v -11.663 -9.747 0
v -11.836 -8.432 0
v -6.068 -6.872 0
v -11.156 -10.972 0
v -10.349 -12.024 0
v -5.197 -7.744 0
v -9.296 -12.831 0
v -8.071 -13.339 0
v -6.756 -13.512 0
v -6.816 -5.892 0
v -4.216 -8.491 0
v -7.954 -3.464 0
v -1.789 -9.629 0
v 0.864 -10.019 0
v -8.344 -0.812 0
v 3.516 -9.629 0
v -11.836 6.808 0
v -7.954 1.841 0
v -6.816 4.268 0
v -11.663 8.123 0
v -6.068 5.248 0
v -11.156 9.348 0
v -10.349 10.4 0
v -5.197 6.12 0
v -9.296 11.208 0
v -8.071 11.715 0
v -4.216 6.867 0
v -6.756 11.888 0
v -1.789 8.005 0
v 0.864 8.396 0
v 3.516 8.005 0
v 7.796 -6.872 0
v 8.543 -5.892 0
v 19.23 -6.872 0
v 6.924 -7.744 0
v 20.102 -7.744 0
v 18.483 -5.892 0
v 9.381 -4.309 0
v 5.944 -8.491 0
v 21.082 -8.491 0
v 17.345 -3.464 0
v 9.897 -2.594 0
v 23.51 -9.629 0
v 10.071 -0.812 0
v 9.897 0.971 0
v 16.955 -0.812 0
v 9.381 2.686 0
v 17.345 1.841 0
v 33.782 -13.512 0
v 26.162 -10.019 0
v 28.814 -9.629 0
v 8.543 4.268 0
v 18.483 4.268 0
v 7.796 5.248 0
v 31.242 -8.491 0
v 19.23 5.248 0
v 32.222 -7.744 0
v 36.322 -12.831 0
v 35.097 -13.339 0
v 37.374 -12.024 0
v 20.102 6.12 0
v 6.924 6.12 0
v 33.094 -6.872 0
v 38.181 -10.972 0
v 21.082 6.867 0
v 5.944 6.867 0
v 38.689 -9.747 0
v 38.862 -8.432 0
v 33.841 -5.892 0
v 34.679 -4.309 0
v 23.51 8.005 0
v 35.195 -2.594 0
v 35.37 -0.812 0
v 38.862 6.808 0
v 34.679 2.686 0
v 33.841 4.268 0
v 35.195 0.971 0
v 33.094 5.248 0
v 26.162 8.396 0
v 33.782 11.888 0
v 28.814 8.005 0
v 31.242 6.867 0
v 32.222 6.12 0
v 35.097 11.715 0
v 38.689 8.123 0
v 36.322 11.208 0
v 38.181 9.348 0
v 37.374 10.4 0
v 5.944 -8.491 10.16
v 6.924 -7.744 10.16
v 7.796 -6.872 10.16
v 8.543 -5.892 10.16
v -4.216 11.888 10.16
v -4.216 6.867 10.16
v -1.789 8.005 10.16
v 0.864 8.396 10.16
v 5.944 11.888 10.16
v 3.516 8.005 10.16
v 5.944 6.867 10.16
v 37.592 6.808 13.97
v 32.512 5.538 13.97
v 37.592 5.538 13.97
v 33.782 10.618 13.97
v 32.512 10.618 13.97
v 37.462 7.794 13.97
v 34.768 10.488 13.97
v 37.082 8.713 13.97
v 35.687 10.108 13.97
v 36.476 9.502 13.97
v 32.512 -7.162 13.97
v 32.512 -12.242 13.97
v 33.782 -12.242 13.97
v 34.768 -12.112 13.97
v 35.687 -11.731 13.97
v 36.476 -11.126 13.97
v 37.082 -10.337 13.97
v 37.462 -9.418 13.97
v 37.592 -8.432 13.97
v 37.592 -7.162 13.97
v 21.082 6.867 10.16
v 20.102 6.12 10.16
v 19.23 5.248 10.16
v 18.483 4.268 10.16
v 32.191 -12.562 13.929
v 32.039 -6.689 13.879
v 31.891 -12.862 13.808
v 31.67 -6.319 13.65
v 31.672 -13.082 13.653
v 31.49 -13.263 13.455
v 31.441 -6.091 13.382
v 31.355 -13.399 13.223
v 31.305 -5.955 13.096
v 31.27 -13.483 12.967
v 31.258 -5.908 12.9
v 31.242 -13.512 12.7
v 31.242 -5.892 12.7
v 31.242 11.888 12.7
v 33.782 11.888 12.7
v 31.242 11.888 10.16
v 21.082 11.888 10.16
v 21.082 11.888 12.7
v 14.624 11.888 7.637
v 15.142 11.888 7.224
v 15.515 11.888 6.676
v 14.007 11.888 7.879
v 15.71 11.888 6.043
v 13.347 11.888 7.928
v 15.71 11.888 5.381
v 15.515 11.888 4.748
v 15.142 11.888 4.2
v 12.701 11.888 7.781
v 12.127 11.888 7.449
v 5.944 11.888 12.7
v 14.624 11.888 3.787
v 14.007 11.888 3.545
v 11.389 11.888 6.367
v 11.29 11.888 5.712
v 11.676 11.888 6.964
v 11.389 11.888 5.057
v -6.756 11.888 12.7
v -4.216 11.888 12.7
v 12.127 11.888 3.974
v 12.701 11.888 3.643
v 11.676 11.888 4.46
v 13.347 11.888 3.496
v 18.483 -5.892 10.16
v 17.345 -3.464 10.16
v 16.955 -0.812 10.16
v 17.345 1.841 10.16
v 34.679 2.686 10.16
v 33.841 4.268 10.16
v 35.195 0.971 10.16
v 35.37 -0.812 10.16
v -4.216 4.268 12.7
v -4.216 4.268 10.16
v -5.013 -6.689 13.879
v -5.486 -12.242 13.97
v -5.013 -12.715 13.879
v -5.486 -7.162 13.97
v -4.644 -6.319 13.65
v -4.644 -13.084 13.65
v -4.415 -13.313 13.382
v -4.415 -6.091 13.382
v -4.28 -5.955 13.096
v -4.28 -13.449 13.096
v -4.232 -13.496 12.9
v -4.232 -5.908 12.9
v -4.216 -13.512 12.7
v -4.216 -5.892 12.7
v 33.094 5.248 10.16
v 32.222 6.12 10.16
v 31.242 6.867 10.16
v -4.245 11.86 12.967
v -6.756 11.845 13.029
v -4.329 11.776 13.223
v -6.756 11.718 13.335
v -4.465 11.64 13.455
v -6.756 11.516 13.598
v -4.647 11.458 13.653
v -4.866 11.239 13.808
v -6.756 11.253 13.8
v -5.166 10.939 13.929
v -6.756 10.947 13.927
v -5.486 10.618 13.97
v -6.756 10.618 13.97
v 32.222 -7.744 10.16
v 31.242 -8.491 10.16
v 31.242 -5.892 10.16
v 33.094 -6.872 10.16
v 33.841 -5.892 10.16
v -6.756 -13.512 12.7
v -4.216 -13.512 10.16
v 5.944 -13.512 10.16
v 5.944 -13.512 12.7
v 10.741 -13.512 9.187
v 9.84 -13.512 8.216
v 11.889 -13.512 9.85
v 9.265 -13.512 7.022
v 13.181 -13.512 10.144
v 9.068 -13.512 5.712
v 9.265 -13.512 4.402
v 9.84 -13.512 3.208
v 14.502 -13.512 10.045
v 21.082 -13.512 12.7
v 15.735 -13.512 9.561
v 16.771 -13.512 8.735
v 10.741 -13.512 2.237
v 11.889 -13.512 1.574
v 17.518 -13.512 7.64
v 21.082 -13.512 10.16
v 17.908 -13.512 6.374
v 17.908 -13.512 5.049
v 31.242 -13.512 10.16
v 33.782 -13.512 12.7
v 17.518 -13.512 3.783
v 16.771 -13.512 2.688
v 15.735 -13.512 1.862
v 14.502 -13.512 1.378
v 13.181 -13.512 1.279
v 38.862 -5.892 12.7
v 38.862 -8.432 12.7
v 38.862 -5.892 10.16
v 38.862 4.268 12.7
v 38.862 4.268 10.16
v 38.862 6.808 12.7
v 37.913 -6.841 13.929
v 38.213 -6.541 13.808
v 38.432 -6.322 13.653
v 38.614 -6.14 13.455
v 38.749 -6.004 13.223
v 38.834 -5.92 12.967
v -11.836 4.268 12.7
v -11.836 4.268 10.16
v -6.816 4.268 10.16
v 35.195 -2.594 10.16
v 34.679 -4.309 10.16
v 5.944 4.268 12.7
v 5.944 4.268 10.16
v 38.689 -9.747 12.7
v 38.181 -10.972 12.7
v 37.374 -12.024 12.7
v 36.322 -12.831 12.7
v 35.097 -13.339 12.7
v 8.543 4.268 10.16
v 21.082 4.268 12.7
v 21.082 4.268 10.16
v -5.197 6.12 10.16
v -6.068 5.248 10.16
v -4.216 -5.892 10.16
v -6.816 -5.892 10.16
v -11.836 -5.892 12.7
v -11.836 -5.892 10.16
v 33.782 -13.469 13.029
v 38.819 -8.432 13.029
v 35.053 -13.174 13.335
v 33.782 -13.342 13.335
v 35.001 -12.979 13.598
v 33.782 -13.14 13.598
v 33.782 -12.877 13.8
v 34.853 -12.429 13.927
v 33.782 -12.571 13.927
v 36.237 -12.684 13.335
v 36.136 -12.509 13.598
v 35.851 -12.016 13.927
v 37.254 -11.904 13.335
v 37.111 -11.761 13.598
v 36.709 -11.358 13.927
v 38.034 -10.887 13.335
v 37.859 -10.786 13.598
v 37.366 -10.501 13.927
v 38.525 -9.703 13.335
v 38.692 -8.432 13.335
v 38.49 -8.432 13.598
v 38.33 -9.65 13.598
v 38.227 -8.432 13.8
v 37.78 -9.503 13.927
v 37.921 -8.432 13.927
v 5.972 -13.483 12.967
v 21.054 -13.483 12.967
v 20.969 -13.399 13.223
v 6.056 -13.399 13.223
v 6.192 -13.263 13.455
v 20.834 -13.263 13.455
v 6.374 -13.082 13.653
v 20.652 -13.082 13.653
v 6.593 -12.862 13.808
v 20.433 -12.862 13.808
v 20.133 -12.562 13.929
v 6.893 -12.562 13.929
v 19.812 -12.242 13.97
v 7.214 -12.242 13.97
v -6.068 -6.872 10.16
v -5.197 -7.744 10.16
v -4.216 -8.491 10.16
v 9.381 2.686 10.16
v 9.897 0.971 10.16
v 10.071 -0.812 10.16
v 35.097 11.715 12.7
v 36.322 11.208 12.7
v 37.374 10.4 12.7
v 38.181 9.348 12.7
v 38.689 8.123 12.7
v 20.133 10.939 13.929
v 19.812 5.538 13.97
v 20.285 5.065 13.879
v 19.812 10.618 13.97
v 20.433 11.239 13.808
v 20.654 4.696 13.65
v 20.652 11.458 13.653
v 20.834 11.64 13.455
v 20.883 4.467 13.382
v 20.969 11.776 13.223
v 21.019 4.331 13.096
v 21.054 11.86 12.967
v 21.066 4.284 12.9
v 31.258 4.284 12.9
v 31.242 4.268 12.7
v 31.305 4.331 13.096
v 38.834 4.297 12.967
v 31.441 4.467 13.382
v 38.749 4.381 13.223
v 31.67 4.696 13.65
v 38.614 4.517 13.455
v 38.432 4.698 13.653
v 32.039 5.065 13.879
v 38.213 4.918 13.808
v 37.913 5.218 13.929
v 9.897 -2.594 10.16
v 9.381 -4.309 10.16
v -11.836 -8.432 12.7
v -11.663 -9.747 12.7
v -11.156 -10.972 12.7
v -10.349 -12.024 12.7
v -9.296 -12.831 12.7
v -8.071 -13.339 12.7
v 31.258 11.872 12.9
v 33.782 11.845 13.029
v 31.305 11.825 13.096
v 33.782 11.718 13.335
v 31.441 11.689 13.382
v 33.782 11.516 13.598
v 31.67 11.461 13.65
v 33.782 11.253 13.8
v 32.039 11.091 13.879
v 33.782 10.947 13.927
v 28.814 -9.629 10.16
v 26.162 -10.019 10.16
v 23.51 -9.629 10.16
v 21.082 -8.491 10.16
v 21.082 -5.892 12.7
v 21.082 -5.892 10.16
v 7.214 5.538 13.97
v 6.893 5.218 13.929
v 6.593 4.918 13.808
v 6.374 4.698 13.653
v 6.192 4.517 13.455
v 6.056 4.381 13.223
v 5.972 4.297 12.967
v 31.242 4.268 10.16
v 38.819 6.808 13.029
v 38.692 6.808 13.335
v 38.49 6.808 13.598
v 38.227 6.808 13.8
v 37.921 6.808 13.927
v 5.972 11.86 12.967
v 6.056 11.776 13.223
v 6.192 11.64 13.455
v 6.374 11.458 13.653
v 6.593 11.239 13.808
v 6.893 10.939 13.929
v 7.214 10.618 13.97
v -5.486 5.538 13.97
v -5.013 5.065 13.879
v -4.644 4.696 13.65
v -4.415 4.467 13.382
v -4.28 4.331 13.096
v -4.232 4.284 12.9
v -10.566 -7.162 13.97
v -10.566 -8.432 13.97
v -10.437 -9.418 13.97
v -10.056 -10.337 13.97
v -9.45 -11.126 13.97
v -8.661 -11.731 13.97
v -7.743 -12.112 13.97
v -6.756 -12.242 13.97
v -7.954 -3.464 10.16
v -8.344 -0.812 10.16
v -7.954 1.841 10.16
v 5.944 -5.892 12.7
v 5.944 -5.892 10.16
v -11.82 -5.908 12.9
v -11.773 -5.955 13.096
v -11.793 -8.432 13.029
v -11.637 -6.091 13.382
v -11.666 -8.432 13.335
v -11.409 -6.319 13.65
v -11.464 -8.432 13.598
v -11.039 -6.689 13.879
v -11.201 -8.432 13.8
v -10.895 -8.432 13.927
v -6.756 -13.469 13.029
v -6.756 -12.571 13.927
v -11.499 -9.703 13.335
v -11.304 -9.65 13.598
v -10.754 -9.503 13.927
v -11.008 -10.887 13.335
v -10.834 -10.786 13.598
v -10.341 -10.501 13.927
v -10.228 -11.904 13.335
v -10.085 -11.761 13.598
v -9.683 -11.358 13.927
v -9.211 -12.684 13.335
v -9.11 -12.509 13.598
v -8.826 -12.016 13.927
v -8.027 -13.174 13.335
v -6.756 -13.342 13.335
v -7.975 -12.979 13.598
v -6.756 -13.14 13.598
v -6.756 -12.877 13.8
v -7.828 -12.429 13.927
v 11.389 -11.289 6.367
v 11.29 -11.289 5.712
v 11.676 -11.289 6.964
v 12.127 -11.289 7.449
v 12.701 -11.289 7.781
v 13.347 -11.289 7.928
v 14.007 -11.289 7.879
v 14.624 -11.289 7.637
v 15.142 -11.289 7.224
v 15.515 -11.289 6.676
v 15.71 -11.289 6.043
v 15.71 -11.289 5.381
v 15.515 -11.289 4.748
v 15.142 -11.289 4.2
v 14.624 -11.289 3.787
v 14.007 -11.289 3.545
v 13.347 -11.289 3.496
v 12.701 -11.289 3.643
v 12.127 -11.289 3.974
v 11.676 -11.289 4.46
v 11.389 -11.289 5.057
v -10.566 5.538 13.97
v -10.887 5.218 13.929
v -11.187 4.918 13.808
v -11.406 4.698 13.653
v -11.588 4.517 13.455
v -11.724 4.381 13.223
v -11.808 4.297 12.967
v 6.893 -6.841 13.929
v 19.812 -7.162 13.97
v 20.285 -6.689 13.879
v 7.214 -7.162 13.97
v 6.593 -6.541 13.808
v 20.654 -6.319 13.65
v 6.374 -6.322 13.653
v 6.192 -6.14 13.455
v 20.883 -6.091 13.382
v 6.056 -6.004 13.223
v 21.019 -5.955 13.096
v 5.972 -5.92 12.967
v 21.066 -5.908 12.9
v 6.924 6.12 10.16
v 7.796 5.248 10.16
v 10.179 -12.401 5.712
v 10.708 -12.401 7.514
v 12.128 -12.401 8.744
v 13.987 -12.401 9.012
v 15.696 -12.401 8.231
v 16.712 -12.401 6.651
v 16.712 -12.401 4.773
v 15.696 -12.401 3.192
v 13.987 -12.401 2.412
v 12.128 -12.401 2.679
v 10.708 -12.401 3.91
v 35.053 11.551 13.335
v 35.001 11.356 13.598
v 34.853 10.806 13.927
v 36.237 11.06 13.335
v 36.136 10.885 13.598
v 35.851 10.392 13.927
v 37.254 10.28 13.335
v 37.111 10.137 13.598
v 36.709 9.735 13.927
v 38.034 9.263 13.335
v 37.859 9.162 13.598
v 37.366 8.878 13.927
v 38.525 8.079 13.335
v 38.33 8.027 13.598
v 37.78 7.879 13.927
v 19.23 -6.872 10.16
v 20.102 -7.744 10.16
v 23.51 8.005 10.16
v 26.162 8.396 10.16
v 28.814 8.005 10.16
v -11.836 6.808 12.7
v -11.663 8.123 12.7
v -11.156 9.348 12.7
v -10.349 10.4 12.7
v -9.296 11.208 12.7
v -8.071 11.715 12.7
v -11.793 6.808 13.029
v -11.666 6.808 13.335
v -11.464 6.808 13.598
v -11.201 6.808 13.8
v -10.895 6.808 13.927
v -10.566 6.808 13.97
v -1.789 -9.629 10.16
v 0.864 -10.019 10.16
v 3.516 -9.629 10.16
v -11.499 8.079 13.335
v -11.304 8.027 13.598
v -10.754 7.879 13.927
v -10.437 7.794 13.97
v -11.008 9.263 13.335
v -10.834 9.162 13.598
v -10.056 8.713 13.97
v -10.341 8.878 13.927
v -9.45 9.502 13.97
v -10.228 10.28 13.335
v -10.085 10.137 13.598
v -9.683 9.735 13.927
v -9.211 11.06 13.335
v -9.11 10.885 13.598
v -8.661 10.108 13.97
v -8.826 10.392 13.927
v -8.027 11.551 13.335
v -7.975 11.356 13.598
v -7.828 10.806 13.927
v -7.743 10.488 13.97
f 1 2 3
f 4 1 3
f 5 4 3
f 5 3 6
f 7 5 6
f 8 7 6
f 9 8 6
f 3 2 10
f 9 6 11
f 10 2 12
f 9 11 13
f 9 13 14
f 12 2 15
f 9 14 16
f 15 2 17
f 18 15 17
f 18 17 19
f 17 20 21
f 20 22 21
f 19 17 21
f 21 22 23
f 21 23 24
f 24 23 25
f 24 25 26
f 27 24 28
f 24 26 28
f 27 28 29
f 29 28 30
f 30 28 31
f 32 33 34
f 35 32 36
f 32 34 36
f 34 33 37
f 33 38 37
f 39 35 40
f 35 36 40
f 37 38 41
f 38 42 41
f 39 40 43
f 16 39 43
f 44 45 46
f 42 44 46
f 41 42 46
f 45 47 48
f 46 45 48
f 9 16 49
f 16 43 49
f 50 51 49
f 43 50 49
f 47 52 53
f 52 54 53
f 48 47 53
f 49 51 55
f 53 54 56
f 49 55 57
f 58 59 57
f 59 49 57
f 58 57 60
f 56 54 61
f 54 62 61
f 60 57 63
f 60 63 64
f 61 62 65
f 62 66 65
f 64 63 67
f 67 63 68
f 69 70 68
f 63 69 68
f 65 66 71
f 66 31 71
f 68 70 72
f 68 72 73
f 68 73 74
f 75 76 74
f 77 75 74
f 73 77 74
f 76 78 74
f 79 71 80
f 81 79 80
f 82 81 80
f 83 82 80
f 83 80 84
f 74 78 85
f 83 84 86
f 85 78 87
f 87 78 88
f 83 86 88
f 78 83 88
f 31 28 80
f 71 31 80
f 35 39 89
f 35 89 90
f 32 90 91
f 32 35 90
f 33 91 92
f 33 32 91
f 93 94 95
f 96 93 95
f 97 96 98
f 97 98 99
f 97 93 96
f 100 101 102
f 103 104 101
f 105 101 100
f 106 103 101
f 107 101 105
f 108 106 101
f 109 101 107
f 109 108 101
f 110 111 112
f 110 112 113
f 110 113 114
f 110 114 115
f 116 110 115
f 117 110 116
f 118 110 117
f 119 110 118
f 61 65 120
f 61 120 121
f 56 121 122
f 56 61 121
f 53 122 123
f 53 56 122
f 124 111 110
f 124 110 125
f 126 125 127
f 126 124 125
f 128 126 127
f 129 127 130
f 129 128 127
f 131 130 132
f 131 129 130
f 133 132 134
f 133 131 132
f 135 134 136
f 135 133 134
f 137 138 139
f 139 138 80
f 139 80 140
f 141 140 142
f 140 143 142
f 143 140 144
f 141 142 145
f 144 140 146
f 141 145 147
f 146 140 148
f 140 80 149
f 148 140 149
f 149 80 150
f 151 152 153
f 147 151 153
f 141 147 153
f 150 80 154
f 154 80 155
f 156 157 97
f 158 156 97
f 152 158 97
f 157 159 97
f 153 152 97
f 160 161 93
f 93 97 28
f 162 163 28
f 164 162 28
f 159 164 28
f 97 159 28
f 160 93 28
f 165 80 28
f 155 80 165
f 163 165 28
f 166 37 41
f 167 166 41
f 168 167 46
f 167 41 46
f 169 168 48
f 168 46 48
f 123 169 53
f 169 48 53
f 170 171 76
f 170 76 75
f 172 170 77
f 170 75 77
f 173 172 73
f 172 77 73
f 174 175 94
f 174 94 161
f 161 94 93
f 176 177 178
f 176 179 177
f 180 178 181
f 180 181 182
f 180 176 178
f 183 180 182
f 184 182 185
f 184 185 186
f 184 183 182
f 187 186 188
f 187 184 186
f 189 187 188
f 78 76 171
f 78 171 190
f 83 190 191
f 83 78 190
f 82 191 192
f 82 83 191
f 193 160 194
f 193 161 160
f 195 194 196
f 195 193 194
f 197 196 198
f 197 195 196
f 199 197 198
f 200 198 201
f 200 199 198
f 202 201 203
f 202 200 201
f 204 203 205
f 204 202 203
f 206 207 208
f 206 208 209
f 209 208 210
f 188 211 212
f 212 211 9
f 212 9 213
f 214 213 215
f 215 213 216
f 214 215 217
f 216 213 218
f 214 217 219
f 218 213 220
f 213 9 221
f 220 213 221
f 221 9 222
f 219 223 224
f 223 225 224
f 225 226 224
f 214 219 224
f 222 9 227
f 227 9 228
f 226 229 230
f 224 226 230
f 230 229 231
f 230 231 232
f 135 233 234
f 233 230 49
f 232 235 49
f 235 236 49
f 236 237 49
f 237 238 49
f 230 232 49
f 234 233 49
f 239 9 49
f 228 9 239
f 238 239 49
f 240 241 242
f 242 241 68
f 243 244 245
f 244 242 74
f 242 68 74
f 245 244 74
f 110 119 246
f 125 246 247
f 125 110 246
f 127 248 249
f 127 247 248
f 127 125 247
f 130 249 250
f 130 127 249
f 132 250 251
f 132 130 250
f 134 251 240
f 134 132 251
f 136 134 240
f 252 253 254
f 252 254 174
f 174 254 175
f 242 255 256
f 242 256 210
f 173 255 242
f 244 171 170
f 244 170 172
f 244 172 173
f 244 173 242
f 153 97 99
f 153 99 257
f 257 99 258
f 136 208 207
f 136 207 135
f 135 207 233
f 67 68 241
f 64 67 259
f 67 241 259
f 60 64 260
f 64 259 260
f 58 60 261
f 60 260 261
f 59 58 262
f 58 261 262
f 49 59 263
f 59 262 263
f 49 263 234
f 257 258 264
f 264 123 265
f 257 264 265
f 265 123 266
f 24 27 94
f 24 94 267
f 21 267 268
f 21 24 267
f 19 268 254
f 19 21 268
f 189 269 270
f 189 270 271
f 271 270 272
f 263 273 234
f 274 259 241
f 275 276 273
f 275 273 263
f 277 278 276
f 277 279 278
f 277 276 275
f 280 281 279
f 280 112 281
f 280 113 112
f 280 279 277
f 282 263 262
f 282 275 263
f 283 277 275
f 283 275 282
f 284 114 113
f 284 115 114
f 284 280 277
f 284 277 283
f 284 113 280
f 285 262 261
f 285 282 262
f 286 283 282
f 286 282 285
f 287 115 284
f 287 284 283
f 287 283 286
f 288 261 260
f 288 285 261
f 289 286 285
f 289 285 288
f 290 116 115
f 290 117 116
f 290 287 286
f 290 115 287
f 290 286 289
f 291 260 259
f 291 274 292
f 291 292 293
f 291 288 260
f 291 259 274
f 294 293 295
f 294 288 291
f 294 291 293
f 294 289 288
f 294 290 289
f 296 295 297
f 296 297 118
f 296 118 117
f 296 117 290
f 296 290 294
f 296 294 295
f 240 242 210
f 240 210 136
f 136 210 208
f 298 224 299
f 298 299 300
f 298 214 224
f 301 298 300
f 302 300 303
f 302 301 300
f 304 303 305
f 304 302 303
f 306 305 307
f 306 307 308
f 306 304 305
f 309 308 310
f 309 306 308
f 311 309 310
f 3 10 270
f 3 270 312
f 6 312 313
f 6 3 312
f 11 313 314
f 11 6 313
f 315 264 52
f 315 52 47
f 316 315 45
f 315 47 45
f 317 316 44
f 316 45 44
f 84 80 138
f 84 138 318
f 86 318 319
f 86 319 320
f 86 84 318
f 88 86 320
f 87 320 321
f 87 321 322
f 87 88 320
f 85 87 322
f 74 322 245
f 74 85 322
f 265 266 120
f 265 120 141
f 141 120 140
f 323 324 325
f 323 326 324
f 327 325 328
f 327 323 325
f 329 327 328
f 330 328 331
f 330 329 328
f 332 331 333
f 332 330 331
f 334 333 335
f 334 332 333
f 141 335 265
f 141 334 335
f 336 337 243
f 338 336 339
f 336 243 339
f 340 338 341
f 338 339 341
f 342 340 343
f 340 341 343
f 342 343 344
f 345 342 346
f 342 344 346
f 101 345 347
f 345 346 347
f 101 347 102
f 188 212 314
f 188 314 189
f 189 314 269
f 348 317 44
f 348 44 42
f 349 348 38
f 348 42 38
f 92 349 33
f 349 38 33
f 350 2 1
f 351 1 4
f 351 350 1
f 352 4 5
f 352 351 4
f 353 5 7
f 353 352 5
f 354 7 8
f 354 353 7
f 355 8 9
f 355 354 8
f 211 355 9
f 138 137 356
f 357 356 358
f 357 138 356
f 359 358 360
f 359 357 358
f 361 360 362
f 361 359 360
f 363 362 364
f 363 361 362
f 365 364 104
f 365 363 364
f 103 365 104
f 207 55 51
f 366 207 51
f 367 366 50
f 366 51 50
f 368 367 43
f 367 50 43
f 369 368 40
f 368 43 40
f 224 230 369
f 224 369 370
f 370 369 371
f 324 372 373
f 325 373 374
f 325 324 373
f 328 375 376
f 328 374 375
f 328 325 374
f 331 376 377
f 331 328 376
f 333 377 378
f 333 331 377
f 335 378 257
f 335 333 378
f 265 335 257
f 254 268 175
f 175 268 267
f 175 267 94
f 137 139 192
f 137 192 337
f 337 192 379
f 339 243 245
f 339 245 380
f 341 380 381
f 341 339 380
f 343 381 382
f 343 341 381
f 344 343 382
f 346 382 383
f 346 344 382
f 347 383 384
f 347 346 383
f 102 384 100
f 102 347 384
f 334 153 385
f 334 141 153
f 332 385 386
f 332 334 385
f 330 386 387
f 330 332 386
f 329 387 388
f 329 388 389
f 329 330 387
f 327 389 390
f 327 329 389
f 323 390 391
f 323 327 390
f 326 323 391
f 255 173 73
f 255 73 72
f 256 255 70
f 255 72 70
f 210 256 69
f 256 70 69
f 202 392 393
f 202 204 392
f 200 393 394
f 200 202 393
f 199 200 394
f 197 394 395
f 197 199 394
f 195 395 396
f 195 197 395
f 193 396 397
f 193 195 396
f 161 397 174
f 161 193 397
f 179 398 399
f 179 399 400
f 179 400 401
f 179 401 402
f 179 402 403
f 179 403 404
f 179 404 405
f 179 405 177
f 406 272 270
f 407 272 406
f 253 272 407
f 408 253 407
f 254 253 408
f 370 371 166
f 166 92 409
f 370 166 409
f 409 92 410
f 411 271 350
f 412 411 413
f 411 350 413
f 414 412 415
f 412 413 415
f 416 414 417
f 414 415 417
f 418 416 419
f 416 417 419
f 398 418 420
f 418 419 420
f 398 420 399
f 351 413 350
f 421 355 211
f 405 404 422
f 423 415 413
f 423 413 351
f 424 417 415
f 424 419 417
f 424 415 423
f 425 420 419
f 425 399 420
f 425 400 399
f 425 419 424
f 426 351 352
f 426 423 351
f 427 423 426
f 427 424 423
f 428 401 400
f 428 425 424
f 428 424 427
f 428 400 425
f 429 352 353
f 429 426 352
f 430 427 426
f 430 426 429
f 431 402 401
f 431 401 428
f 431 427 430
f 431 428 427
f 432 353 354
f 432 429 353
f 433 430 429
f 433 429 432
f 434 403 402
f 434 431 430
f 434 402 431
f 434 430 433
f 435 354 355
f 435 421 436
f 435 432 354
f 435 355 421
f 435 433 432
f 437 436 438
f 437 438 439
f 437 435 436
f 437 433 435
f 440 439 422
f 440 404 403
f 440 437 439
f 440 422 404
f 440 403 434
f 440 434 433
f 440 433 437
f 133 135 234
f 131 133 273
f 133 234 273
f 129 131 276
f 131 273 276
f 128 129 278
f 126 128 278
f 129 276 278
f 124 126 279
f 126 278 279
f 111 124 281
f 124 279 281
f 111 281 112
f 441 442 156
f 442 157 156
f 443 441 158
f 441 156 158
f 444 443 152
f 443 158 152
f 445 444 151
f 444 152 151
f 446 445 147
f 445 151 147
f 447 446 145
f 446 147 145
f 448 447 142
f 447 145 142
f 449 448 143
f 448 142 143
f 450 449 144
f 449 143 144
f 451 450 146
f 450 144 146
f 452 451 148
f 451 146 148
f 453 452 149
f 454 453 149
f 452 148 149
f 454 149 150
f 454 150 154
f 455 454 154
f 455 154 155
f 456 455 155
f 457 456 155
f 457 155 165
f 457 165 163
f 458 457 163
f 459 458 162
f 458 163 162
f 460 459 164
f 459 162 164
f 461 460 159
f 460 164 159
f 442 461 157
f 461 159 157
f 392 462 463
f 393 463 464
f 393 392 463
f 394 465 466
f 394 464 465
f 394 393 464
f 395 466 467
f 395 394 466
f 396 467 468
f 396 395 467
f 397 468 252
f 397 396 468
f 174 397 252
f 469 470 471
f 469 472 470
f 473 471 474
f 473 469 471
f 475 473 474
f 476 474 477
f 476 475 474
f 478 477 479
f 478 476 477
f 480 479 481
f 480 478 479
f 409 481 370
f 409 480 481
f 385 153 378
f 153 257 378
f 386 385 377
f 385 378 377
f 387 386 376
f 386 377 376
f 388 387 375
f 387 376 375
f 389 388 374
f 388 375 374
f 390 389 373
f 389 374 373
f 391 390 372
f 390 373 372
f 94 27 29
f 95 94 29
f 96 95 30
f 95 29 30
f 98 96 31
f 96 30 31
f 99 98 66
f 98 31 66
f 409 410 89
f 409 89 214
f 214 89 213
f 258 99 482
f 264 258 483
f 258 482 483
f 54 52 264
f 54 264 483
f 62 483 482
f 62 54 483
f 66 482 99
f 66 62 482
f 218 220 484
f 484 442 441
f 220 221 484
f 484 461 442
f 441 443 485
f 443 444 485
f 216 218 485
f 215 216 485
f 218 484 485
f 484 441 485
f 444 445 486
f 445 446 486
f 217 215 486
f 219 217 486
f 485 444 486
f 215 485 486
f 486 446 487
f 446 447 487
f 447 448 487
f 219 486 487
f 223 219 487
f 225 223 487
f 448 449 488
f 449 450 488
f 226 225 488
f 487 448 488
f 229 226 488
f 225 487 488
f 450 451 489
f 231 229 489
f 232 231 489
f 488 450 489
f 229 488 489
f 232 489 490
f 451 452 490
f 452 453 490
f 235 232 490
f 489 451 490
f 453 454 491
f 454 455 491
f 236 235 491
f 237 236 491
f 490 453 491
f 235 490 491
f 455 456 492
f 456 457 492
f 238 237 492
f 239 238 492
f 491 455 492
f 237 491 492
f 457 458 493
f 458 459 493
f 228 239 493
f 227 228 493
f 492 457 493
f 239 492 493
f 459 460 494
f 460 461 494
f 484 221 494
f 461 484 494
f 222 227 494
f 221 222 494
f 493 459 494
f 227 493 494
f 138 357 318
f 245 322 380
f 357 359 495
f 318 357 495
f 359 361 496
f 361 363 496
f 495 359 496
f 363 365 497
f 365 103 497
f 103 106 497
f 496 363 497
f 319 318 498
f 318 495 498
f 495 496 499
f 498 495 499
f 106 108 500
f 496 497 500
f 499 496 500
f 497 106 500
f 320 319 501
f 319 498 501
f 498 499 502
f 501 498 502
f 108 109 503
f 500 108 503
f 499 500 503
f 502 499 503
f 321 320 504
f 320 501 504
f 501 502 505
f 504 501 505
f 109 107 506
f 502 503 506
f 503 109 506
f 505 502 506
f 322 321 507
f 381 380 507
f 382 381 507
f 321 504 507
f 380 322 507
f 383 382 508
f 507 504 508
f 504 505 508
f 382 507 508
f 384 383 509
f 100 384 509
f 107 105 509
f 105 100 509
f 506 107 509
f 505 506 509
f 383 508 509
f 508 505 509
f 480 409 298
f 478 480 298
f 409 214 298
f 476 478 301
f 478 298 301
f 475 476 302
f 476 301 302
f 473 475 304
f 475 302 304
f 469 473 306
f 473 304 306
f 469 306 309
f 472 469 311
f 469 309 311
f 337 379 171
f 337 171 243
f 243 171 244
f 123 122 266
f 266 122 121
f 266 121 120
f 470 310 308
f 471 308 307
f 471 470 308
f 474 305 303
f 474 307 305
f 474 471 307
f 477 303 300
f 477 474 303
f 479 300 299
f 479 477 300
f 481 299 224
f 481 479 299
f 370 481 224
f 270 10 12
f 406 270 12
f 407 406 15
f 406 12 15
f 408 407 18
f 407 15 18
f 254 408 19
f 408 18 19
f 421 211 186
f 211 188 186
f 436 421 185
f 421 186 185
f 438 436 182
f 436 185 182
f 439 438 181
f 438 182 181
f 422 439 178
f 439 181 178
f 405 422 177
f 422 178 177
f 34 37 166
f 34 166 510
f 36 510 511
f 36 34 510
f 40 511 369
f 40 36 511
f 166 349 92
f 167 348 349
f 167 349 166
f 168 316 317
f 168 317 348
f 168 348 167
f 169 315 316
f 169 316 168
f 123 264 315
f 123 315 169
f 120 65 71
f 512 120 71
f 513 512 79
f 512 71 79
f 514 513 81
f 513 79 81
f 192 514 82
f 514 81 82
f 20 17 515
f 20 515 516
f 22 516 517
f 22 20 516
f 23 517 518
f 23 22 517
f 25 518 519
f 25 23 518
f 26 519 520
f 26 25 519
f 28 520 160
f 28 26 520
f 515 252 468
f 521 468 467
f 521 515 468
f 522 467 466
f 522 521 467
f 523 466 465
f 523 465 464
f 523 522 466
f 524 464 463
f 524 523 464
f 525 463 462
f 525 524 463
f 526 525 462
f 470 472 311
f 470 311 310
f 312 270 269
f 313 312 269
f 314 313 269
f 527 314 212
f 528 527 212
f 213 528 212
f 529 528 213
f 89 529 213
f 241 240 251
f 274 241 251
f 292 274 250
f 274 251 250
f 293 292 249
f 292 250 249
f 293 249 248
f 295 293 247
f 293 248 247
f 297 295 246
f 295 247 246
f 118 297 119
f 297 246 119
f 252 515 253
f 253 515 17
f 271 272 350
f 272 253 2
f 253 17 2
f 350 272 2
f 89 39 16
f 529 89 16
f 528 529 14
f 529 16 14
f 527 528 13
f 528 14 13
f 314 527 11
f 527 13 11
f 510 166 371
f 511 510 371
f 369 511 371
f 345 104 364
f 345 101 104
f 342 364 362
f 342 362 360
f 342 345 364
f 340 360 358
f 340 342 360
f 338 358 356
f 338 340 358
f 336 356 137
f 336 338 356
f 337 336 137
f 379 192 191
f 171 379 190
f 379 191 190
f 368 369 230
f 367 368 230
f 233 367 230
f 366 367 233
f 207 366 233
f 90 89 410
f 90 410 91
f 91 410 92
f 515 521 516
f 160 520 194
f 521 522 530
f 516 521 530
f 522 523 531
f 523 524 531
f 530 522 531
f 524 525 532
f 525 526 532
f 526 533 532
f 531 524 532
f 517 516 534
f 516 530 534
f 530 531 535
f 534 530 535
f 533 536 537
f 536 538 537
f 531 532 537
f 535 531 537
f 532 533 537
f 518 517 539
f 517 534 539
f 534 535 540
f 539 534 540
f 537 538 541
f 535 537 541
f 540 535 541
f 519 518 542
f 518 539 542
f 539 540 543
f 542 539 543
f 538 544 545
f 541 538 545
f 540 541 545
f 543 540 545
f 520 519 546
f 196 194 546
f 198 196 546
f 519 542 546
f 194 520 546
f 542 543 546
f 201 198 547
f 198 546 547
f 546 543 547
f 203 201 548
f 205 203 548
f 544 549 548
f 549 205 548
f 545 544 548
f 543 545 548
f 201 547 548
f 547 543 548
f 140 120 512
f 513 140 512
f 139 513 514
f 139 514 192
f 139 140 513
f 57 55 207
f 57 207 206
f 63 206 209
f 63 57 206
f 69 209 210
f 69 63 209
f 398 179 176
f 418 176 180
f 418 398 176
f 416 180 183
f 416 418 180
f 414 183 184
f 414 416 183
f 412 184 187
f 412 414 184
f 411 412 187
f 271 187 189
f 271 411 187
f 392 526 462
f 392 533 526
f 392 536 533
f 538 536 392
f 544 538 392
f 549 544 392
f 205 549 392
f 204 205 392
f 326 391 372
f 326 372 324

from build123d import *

# Parameters (mm, degrees)
F1_DEPTH        = 10.16
F2_DEPTH        = 13.97
F3_DEPTH        = 10.16
F8_R            = 5.08
F9_R            = 1.27
F11_D           = 4.445
F11_CSINK_D     = 8.89
F11_CSINK_ANGLE = 90


with BuildPart() as f1:
    # F0 (on Top) → F1 (new body)
    with BuildSketch(Plane.XY):
        with BuildLine():
            Line((-4.2164, 11.888180349), (-11.8364, 11.888180349))
            Line((-11.8364, 11.888180349), (-11.8364, 4.268180349))
            Line((-11.8364, 4.268180349), (-6.8157005053, 4.268180349))
            ThreePointArc((-6.8157005053, 4.268180349), (-5.6470856878, 5.6988660368), (-4.2164, 6.8674808543))
            Line((-4.2164, 6.8674808543), (-4.2164, 11.888180349))
        make_face()
        with BuildLine():
            Line((-4.2164, 4.268180349), (-4.2164, 6.8674808543))
            ThreePointArc((-4.2164, 6.8674808543), (-5.6470856878, 5.6988660368), (-6.8157005053, 4.268180349))
            Line((-6.8157005053, 4.268180349), (-4.2164, 4.268180349))
        make_face()
        with BuildLine():
            Line((13.5636, 11.888180349), (5.9436, 11.888180349))
            Line((5.9436, 11.888180349), (5.9436, 6.8674808543))
            ThreePointArc((5.9436, 6.8674808543), (7.3742856878, 5.6988660368), (8.5429005053, 4.268180349))
            Line((8.5429005053, 4.268180349), (13.5636, 4.268180349))
            Line((13.5636, 4.268180349), (13.5636, 11.888180349))
        make_face()
        with BuildLine():
            Line((13.5636, -13.511819651), (13.5636, -5.891819651))
            Line((13.5636, -5.891819651), (8.5429005053, -5.891819651))
            ThreePointArc((8.5429005053, -5.891819651), (7.3742856878, -7.3225053388), (5.9436, -8.4911201562))
            Line((5.9436, -8.4911201562), (5.9436, -13.511819651))
            Line((5.9436, -13.511819651), (13.5636, -13.511819651))
        make_face()
        with BuildLine():
            Line((-4.2164, -8.4911201562), (-4.2164, -13.511819651))
            Line((-4.2164, -13.511819651), (5.9436, -13.511819651))
            Line((5.9436, -13.511819651), (5.9436, -8.4911201562))
            ThreePointArc((5.9436, -8.4911201562), (0.8636, -10.019319651), (-4.2164, -8.4911201562))
        make_face()
        with BuildLine():
            Line((-6.8157005053, -5.891819651), (-11.8364, -5.891819651))
            Line((-11.8364, -5.891819651), (-11.8364, -13.511819651))
            Line((-11.8364, -13.511819651), (-4.2164, -13.511819651))
            Line((-4.2164, -13.511819651), (-4.2164, -8.4911201562))
            ThreePointArc((-4.2164, -8.4911201562), (-5.6470856878, -7.3225053388), (-6.8157005053, -5.891819651))
        make_face()
        with BuildLine():
            Line((-6.8157005053, 4.268180349), (-11.8364, 4.268180349))
            Line((-11.8364, 4.268180349), (-11.8364, -5.891819651))
            Line((-11.8364, -5.891819651), (-6.8157005053, -5.891819651))
            ThreePointArc((-6.8157005053, -5.891819651), (-8.3439, -0.811819651), (-6.8157005053, 4.268180349))
        make_face()
        with BuildLine():
            Line((13.5636, -5.891819651), (13.5636, 4.268180349))
            Line((13.5636, 4.268180349), (8.5429005053, 4.268180349))
            ThreePointArc((8.5429005053, 4.268180349), (9.6807768626, 1.8406223227), (10.0711, -0.811819651))
            ThreePointArc((10.0711, -0.811819651), (9.6807768626, -3.4642616247), (8.5429005053, -5.891819651))
            Line((8.5429005053, -5.891819651), (13.5636, -5.891819651))
        make_face()
        with BuildLine():
            Line((5.9436, 11.888180349), (-4.2164, 11.888180349))
            Line((-4.2164, 11.888180349), (-4.2164, 6.8674808543))
            ThreePointArc((-4.2164, 6.8674808543), (0.8636, 8.395680349), (5.9436, 6.8674808543))
            Line((5.9436, 6.8674808543), (5.9436, 11.888180349))
        make_face()
        with BuildLine():
            ThreePointArc((8.5429005053, 4.268180349), (7.3742856878, 5.6988660368), (5.9436, 6.8674808543))
            Line((5.9436, 6.8674808543), (5.9436, 4.268180349))
            Line((5.9436, 4.268180349), (8.5429005053, 4.268180349))
        make_face()
        with BuildLine():
            Line((5.9436, -5.891819651), (5.9436, -8.4911201562))
            ThreePointArc((5.9436, -8.4911201562), (7.3742856878, -7.3225053388), (8.5429005053, -5.891819651))
            Line((8.5429005053, -5.891819651), (5.9436, -5.891819651))
        make_face()
        with BuildLine():
            Line((-4.2164, -5.891819651), (-6.8157005053, -5.891819651))
            ThreePointArc((-6.8157005053, -5.891819651), (-5.6470856878, -7.3225053388), (-4.2164, -8.4911201562))
            Line((-4.2164, -8.4911201562), (-4.2164, -5.891819651))
        make_face()
    extrude(amount=F1_DEPTH)

    # F0 (on Top) → F2 (join)
    with BuildSketch(Plane.XY):
        with BuildLine():
            Line((-6.8157005053, -5.891819651), (-11.8364, -5.891819651))
            Line((-11.8364, -5.891819651), (-11.8364, -13.511819651))
            Line((-11.8364, -13.511819651), (-4.2164, -13.511819651))
            Line((-4.2164, -13.511819651), (-4.2164, -8.4911201562))
            ThreePointArc((-4.2164, -8.4911201562), (-5.6470856878, -7.3225053388), (-6.8157005053, -5.891819651))
        make_face()
        with BuildLine():
            Line((-4.2164, -5.891819651), (-6.8157005053, -5.891819651))
            ThreePointArc((-6.8157005053, -5.891819651), (-5.6470856878, -7.3225053388), (-4.2164, -8.4911201562))
            Line((-4.2164, -8.4911201562), (-4.2164, -5.891819651))
        make_face()
        with BuildLine():
            Line((13.5636, -13.511819651), (13.5636, -5.891819651))
            Line((13.5636, -5.891819651), (8.5429005053, -5.891819651))
            ThreePointArc((8.5429005053, -5.891819651), (7.3742856878, -7.3225053388), (5.9436, -8.4911201562))
            Line((5.9436, -8.4911201562), (5.9436, -13.511819651))
            Line((5.9436, -13.511819651), (13.5636, -13.511819651))
        make_face()
        with BuildLine():
            Line((5.9436, -5.891819651), (5.9436, -8.4911201562))
            ThreePointArc((5.9436, -8.4911201562), (7.3742856878, -7.3225053388), (8.5429005053, -5.891819651))
            Line((8.5429005053, -5.891819651), (5.9436, -5.891819651))
        make_face()
        with BuildLine():
            Line((13.5636, 11.888180349), (5.9436, 11.888180349))
            Line((5.9436, 11.888180349), (5.9436, 6.8674808543))
            ThreePointArc((5.9436, 6.8674808543), (7.3742856878, 5.6988660368), (8.5429005053, 4.268180349))
            Line((8.5429005053, 4.268180349), (13.5636, 4.268180349))
            Line((13.5636, 4.268180349), (13.5636, 11.888180349))
        make_face()
        with BuildLine():
            ThreePointArc((8.5429005053, 4.268180349), (7.3742856878, 5.6988660368), (5.9436, 6.8674808543))
            Line((5.9436, 6.8674808543), (5.9436, 4.268180349))
            Line((5.9436, 4.268180349), (8.5429005053, 4.268180349))
        make_face()
        with BuildLine():
            Line((-4.2164, 11.888180349), (-11.8364, 11.888180349))
            Line((-11.8364, 11.888180349), (-11.8364, 4.268180349))
            Line((-11.8364, 4.268180349), (-6.8157005053, 4.268180349))
            ThreePointArc((-6.8157005053, 4.268180349), (-5.6470856878, 5.6988660368), (-4.2164, 6.8674808543))
            Line((-4.2164, 6.8674808543), (-4.2164, 11.888180349))
        make_face()
        with BuildLine():
            Line((-4.2164, 4.268180349), (-4.2164, 6.8674808543))
            ThreePointArc((-4.2164, 6.8674808543), (-5.6470856878, 5.6988660368), (-6.8157005053, 4.268180349))
            Line((-6.8157005053, 4.268180349), (-4.2164, 4.268180349))
        make_face()
    extrude(amount=F2_DEPTH)

    # F0 (on Top) → F3 (cut)
    with BuildSketch(Plane.XY):
        with BuildLine():
            Line((-4.2164, 4.268180349), (-4.2164, 6.8674808543))
            ThreePointArc((-4.2164, 6.8674808543), (-5.6470856878, 5.6988660368), (-6.8157005053, 4.268180349))
            Line((-6.8157005053, 4.268180349), (-4.2164, 4.268180349))
        make_face()
        with BuildLine():
            Line((-4.2164, -5.891819651), (-6.8157005053, -5.891819651))
            ThreePointArc((-6.8157005053, -5.891819651), (-5.6470856878, -7.3225053388), (-4.2164, -8.4911201562))
            Line((-4.2164, -8.4911201562), (-4.2164, -5.891819651))
        make_face()
        with BuildLine():
            Line((5.9436, -5.891819651), (5.9436, -8.4911201562))
            ThreePointArc((5.9436, -8.4911201562), (7.3742856878, -7.3225053388), (8.5429005053, -5.891819651))
            Line((8.5429005053, -5.891819651), (5.9436, -5.891819651))
        make_face()
        with BuildLine():
            ThreePointArc((8.5429005053, 4.268180349), (7.3742856878, 5.6988660368), (5.9436, 6.8674808543))
            Line((5.9436, 6.8674808543), (5.9436, 4.268180349))
            Line((5.9436, 4.268180349), (8.5429005053, 4.268180349))
        make_face()
    extrude(amount=F3_DEPTH, mode=Mode.SUBTRACT)


with BuildPart() as f4_1:
    # F4: copy of F1
    add(f1.part.moved(Location((25.654, 0, 0))))


with BuildPart() as f6_1:
    # F6: copy of F1
    add(f1.part.moved(Location((25.2984, 0, 0))))


with BuildPart() as f1_1:
    add(f1.part)

    # F7: union F6_1
    add(f6_1.part)

    # F8
    f8_edges = [f1_1.edges().sort_by_distance(p)[0] for p in [
        (-11.8364, 11.88818, 6.985),
        (38.862, 11.88818, 6.985),
        (38.862, -13.51182, 6.985),
        (-11.8364, -13.51182, 6.985),
    ]]
    fillet(f8_edges, radius=F8_R)

    # F9
    f9_edges = [f1_1.edges().sort_by_distance(p)[0] for p in [
        (-10.348502, 10.400283, 13.97),
        (-4.2164, 8.07818, 13.97),
        (-8.0264, 4.26818, 13.97),
        (-8.0264, -5.89182, 13.97),
        (-4.2164, -9.70182, 13.97),
        (-10.348502, -12.023922, 13.97),
        (5.9436, -9.70182, 13.97),
        (9.7028, -5.89182, 13.97),
        (13.5128, -5.89182, 13.97),
        (9.7028, -13.51182, 13.97),
        (13.5128, -13.51182, 13.97),
        (32.512, -13.51182, 13.97),
        (21.082, -9.70182, 13.97),
        (13.5128, 11.88818, 13.97),
        (9.7028, 11.88818, 13.97),
        (17.3228, 11.88818, 13.97),
        (5.9436, 8.07818, 13.97),
        (21.082, 8.07818, 13.97),
        (13.5128, 4.26818, 13.97),
        (9.7028, 4.26818, 13.97),
        (31.242, 8.07818, 13.97),
        (35.052, 4.26818, 13.97),
        (35.052, -5.89182, 13.97),
        (31.242, -9.70182, 13.97),
        (37.374102, 10.400283, 13.97),
        (37.374102, -12.023922, 13.97),
    ]]
    fillet(f9_edges, radius=F9_R)

    # F11 (through all)
    with Locations(Plane.XZ.offset(13.511819651)):
        with Locations((13.5128, 5.7118628174)):
            CounterSinkHole(F11_D / 2, F11_CSINK_D / 2, counter_sink_angle=F11_CSINK_ANGLE)


solid = f1_1.part
